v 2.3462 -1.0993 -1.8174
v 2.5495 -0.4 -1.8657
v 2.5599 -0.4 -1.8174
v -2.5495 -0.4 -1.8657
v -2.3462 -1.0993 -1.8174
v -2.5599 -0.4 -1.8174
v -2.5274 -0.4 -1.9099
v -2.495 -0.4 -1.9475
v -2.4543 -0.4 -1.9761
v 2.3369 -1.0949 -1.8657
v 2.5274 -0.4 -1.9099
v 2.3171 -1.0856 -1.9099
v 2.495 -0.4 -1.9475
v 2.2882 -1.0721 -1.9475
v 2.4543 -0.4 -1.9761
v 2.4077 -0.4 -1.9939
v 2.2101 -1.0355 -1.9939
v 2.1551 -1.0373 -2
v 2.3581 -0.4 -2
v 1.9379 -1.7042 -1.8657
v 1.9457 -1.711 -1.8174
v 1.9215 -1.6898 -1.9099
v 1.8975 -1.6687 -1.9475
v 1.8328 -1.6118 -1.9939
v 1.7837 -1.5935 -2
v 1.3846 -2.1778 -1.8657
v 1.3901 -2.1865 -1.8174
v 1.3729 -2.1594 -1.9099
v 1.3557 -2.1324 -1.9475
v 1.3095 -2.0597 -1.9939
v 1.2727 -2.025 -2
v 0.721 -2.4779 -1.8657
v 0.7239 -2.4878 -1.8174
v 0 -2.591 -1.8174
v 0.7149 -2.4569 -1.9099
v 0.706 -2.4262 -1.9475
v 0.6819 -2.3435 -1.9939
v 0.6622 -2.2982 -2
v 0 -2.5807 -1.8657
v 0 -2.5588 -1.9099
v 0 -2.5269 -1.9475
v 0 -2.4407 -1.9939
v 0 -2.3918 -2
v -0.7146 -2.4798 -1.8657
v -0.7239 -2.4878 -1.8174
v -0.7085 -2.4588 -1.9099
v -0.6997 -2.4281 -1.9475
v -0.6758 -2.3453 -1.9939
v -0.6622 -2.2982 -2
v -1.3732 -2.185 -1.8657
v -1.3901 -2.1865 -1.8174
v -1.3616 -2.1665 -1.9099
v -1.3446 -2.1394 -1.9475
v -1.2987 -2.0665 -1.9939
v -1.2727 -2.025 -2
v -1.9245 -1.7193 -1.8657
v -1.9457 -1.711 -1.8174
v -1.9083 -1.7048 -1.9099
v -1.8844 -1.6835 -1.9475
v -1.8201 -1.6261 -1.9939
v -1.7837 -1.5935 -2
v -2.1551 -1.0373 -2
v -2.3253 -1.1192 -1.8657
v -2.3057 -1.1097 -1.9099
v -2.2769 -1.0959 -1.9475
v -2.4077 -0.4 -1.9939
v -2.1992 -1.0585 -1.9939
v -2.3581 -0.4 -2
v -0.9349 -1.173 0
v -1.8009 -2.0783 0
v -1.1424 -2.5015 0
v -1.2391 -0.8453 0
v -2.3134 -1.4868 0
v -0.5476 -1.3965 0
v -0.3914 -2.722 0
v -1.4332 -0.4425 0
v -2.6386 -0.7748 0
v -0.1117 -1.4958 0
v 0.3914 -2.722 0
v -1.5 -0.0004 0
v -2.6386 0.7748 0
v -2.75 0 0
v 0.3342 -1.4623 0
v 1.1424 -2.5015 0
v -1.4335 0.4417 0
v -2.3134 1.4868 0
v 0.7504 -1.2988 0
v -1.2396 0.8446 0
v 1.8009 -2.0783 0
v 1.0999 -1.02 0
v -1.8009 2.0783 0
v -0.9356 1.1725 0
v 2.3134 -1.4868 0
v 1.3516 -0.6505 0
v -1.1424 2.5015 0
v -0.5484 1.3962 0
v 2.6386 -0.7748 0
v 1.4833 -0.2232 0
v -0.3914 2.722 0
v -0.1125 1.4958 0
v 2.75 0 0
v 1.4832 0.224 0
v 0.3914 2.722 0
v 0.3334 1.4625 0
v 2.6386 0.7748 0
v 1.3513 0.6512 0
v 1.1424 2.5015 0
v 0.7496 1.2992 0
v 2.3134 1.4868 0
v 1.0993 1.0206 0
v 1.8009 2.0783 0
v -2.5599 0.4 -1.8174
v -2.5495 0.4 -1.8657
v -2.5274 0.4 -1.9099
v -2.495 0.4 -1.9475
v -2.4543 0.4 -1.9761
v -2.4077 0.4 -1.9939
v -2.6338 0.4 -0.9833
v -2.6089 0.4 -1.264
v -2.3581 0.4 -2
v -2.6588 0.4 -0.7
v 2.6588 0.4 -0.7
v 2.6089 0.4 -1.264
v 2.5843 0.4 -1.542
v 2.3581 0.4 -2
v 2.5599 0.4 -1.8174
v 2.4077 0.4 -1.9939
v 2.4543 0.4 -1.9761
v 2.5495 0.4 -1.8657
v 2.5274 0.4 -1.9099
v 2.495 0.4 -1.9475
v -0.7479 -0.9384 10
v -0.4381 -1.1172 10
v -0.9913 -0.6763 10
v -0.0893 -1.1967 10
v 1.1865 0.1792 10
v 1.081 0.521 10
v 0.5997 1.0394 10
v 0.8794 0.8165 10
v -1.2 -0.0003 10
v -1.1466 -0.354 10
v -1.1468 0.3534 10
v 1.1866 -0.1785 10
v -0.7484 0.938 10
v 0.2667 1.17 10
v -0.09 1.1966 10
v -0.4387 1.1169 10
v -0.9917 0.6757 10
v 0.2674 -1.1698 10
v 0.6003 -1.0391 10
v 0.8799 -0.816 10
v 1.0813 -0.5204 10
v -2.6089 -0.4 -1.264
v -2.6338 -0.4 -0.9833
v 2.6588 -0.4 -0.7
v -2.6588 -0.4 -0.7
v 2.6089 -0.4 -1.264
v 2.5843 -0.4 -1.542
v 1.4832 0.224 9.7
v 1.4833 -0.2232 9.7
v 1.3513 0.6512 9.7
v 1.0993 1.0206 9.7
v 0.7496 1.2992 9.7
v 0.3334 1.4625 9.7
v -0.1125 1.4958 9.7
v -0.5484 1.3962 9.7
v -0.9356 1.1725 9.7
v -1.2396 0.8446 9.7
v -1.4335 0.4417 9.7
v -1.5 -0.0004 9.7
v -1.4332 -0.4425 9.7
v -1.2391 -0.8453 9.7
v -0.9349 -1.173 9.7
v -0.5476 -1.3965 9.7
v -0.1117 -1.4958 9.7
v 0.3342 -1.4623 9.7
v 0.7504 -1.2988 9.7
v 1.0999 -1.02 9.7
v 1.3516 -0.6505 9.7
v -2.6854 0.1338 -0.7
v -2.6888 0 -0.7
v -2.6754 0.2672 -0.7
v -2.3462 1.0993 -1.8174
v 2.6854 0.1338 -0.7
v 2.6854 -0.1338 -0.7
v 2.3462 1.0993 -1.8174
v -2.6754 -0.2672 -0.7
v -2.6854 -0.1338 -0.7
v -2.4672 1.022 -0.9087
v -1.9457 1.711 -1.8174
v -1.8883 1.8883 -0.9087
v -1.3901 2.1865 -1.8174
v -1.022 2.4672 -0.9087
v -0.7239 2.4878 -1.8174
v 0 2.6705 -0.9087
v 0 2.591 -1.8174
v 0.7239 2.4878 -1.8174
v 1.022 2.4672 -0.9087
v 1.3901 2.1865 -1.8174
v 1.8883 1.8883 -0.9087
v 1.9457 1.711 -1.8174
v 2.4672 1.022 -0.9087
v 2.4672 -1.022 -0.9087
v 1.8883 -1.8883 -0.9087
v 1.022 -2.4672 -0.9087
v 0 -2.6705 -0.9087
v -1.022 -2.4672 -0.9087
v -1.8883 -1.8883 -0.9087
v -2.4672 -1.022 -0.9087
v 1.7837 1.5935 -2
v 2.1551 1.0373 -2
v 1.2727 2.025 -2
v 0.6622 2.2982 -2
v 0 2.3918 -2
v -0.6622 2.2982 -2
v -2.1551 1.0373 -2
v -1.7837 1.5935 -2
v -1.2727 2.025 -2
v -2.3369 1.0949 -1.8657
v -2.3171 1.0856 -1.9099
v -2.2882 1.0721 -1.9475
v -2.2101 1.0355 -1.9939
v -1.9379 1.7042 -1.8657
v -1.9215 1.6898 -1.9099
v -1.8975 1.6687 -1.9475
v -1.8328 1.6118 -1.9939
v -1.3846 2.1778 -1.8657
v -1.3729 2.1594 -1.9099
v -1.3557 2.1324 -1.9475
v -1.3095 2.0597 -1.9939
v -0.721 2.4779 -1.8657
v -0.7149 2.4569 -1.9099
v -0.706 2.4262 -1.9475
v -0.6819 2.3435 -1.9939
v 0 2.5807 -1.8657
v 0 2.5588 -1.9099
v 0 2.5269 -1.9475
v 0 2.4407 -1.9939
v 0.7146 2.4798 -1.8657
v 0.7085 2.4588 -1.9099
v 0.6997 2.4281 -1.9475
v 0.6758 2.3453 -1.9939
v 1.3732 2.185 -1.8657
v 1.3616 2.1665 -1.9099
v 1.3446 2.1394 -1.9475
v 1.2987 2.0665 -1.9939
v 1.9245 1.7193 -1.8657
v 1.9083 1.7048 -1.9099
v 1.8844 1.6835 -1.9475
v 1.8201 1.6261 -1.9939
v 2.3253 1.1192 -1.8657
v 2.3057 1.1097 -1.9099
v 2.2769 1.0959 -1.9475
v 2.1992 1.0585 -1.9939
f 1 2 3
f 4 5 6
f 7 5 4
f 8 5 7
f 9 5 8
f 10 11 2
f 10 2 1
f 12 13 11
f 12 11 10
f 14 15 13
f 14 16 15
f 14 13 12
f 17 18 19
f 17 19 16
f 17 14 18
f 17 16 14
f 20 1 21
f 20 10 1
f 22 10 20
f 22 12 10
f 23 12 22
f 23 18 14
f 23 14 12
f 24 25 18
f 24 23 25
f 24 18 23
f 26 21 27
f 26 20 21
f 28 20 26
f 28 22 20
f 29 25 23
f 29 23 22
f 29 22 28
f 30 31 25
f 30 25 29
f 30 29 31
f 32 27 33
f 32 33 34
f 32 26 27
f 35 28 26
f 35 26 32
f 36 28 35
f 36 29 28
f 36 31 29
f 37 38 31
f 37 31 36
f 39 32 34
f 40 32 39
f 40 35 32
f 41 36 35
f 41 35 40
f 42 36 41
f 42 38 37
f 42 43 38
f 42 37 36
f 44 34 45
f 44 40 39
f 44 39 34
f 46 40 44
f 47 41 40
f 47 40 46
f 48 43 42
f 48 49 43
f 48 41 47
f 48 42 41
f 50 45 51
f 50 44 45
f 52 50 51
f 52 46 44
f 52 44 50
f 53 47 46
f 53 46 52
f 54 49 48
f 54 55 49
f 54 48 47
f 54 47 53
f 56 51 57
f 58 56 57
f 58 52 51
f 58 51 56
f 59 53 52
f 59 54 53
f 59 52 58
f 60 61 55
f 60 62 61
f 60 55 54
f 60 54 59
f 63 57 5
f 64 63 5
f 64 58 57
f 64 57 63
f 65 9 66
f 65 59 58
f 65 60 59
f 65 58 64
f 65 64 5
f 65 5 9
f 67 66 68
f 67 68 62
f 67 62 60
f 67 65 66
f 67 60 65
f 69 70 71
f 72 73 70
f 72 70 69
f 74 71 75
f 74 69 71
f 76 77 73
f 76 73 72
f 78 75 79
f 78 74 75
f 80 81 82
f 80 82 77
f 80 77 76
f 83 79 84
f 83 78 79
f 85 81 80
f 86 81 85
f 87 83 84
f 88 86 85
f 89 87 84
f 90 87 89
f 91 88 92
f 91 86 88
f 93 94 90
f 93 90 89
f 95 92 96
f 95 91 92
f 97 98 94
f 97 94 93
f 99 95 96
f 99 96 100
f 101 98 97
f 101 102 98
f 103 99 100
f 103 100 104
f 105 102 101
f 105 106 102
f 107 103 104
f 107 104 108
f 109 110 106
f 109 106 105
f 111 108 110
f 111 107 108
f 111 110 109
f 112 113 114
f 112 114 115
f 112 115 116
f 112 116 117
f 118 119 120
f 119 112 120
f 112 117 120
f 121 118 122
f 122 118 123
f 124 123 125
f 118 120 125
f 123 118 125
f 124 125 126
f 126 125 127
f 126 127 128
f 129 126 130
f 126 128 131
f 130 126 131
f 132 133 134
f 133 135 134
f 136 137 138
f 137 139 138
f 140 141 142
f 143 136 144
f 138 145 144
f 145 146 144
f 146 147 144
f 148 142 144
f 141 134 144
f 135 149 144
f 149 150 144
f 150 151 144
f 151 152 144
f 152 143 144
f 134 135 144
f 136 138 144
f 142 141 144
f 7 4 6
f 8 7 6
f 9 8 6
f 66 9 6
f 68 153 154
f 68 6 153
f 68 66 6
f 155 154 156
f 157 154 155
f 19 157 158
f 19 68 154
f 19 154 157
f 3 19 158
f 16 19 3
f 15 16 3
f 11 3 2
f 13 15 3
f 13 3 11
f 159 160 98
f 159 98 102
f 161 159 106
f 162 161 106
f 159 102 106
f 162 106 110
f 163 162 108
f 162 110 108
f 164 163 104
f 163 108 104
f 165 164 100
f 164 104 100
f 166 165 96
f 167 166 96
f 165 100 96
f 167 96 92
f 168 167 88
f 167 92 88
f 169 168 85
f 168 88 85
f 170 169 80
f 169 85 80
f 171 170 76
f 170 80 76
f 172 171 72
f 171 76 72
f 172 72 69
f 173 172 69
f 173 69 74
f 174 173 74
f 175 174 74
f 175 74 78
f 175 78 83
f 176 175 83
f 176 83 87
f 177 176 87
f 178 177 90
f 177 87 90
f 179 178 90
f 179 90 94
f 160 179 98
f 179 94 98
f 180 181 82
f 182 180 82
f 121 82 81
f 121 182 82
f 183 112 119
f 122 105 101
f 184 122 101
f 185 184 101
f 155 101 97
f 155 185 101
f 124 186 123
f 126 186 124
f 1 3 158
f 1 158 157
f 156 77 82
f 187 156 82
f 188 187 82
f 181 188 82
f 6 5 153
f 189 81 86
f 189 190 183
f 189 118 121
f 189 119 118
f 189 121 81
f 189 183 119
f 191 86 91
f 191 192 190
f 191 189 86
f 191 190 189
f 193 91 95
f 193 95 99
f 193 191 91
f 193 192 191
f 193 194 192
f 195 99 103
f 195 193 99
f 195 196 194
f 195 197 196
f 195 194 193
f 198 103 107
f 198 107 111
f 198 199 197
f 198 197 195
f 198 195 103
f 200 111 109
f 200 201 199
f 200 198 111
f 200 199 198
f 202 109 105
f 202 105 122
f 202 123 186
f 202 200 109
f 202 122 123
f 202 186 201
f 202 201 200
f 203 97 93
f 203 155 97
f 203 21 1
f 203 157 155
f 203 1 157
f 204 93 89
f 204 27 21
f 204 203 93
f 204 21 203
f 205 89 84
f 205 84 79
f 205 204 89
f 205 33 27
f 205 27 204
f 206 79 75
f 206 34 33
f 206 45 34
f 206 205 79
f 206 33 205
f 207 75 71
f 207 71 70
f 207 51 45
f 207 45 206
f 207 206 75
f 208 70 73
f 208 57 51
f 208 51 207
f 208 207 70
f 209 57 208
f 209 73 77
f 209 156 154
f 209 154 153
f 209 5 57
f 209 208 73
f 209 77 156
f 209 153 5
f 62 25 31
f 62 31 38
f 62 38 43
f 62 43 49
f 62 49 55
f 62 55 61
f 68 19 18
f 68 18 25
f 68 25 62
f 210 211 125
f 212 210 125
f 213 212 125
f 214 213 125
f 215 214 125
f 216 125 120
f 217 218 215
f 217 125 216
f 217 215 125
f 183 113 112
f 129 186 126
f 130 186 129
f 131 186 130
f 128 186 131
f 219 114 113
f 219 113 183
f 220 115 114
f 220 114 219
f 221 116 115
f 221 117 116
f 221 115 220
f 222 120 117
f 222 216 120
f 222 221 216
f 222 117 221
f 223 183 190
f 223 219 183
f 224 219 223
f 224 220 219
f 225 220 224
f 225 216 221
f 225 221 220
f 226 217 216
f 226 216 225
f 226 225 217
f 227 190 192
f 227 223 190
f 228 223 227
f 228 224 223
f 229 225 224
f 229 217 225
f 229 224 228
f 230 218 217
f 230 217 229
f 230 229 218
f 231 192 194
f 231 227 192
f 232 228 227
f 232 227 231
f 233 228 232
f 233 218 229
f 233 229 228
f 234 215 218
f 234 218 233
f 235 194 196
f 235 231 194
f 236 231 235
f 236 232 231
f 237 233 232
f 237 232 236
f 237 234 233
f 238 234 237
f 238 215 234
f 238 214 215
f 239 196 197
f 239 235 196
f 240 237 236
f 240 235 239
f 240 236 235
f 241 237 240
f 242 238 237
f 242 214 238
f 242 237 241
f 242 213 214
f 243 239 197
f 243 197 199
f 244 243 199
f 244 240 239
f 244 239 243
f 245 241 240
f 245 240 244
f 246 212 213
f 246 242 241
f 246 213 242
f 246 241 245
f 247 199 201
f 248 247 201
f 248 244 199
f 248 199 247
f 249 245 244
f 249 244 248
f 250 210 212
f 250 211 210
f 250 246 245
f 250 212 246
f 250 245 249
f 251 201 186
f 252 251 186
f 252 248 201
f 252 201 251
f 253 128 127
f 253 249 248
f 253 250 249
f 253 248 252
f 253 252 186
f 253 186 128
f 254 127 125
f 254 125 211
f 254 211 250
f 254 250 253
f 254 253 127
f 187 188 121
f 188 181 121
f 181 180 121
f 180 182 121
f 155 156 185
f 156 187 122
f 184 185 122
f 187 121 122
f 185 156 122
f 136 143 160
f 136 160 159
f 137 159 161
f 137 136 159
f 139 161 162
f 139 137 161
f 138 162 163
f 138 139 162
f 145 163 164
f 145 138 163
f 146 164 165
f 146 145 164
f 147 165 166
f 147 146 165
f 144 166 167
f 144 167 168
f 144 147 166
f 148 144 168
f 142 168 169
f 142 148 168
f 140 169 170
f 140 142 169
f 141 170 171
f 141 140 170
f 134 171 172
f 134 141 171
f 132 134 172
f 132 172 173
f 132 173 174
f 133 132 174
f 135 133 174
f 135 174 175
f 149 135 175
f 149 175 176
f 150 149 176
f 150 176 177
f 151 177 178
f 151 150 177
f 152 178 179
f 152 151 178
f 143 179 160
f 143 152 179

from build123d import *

# Parameters (mm, degrees)
ESQUISSE2_W             = 5.5
ESQUISSE2_H             = 0.8
ENLEV_MAT_EXTRU_1_DEPTH = 1.3
ESQUISSE3_W             = 1.5
ESQUISSE3_H             = 10
CHANFREIN1_SIZE         = 0.3


with BuildPart() as part:
    # Esquisse1 → Base-Révolution (revolve)
    with BuildSketch(Plane(origin=(0, 0, 0), x_dir=(1, 0, 0), z_dir=(0, 1, 0))):
        with BuildLine():
            Line((0, 0), (2.75, 0))
            Line((2.75, 0), (2.590995378, 1.817431149))
            ThreePointArc((2.590995378, 1.817431149), (2.52687448, 1.947455467), (2.391756438, 2))
            Line((2.391756438, 2), (0, 2))
            Line((0, 2), (0, 0))
        make_face()
    revolve(axis=Axis((0, 0, 0), (0, 0, -1)))

    # Esquisse2 → Enlev. mat.-Extru.1 (cut)
    with BuildSketch(Plane.XY.offset(-2)):
        Rectangle(ESQUISSE2_W, ESQUISSE2_H)
    extrude(amount=ENLEV_MAT_EXTRU_1_DEPTH, mode=Mode.SUBTRACT)

    # Esquisse3 → Boss.-Révol.1 (revolve)
    with BuildSketch(Plane(origin=(0, 0, 0), x_dir=(1, 0, 0), z_dir=(0, 1, 0))):
        with Locations((0.75, -5)):
            Rectangle(ESQUISSE3_W, ESQUISSE3_H)
    revolve(axis=Axis((0, 0, 0), (0, 0, 1)))

    # Chanfrein1
    chanfrein1_edges = [part.edges().sort_by_distance(p)[0] for p in [
        (-1.5, 0, 10),
    ]]
    chamfer(chanfrein1_edges, length=CHANFREIN1_SIZE)


solid = part.part
